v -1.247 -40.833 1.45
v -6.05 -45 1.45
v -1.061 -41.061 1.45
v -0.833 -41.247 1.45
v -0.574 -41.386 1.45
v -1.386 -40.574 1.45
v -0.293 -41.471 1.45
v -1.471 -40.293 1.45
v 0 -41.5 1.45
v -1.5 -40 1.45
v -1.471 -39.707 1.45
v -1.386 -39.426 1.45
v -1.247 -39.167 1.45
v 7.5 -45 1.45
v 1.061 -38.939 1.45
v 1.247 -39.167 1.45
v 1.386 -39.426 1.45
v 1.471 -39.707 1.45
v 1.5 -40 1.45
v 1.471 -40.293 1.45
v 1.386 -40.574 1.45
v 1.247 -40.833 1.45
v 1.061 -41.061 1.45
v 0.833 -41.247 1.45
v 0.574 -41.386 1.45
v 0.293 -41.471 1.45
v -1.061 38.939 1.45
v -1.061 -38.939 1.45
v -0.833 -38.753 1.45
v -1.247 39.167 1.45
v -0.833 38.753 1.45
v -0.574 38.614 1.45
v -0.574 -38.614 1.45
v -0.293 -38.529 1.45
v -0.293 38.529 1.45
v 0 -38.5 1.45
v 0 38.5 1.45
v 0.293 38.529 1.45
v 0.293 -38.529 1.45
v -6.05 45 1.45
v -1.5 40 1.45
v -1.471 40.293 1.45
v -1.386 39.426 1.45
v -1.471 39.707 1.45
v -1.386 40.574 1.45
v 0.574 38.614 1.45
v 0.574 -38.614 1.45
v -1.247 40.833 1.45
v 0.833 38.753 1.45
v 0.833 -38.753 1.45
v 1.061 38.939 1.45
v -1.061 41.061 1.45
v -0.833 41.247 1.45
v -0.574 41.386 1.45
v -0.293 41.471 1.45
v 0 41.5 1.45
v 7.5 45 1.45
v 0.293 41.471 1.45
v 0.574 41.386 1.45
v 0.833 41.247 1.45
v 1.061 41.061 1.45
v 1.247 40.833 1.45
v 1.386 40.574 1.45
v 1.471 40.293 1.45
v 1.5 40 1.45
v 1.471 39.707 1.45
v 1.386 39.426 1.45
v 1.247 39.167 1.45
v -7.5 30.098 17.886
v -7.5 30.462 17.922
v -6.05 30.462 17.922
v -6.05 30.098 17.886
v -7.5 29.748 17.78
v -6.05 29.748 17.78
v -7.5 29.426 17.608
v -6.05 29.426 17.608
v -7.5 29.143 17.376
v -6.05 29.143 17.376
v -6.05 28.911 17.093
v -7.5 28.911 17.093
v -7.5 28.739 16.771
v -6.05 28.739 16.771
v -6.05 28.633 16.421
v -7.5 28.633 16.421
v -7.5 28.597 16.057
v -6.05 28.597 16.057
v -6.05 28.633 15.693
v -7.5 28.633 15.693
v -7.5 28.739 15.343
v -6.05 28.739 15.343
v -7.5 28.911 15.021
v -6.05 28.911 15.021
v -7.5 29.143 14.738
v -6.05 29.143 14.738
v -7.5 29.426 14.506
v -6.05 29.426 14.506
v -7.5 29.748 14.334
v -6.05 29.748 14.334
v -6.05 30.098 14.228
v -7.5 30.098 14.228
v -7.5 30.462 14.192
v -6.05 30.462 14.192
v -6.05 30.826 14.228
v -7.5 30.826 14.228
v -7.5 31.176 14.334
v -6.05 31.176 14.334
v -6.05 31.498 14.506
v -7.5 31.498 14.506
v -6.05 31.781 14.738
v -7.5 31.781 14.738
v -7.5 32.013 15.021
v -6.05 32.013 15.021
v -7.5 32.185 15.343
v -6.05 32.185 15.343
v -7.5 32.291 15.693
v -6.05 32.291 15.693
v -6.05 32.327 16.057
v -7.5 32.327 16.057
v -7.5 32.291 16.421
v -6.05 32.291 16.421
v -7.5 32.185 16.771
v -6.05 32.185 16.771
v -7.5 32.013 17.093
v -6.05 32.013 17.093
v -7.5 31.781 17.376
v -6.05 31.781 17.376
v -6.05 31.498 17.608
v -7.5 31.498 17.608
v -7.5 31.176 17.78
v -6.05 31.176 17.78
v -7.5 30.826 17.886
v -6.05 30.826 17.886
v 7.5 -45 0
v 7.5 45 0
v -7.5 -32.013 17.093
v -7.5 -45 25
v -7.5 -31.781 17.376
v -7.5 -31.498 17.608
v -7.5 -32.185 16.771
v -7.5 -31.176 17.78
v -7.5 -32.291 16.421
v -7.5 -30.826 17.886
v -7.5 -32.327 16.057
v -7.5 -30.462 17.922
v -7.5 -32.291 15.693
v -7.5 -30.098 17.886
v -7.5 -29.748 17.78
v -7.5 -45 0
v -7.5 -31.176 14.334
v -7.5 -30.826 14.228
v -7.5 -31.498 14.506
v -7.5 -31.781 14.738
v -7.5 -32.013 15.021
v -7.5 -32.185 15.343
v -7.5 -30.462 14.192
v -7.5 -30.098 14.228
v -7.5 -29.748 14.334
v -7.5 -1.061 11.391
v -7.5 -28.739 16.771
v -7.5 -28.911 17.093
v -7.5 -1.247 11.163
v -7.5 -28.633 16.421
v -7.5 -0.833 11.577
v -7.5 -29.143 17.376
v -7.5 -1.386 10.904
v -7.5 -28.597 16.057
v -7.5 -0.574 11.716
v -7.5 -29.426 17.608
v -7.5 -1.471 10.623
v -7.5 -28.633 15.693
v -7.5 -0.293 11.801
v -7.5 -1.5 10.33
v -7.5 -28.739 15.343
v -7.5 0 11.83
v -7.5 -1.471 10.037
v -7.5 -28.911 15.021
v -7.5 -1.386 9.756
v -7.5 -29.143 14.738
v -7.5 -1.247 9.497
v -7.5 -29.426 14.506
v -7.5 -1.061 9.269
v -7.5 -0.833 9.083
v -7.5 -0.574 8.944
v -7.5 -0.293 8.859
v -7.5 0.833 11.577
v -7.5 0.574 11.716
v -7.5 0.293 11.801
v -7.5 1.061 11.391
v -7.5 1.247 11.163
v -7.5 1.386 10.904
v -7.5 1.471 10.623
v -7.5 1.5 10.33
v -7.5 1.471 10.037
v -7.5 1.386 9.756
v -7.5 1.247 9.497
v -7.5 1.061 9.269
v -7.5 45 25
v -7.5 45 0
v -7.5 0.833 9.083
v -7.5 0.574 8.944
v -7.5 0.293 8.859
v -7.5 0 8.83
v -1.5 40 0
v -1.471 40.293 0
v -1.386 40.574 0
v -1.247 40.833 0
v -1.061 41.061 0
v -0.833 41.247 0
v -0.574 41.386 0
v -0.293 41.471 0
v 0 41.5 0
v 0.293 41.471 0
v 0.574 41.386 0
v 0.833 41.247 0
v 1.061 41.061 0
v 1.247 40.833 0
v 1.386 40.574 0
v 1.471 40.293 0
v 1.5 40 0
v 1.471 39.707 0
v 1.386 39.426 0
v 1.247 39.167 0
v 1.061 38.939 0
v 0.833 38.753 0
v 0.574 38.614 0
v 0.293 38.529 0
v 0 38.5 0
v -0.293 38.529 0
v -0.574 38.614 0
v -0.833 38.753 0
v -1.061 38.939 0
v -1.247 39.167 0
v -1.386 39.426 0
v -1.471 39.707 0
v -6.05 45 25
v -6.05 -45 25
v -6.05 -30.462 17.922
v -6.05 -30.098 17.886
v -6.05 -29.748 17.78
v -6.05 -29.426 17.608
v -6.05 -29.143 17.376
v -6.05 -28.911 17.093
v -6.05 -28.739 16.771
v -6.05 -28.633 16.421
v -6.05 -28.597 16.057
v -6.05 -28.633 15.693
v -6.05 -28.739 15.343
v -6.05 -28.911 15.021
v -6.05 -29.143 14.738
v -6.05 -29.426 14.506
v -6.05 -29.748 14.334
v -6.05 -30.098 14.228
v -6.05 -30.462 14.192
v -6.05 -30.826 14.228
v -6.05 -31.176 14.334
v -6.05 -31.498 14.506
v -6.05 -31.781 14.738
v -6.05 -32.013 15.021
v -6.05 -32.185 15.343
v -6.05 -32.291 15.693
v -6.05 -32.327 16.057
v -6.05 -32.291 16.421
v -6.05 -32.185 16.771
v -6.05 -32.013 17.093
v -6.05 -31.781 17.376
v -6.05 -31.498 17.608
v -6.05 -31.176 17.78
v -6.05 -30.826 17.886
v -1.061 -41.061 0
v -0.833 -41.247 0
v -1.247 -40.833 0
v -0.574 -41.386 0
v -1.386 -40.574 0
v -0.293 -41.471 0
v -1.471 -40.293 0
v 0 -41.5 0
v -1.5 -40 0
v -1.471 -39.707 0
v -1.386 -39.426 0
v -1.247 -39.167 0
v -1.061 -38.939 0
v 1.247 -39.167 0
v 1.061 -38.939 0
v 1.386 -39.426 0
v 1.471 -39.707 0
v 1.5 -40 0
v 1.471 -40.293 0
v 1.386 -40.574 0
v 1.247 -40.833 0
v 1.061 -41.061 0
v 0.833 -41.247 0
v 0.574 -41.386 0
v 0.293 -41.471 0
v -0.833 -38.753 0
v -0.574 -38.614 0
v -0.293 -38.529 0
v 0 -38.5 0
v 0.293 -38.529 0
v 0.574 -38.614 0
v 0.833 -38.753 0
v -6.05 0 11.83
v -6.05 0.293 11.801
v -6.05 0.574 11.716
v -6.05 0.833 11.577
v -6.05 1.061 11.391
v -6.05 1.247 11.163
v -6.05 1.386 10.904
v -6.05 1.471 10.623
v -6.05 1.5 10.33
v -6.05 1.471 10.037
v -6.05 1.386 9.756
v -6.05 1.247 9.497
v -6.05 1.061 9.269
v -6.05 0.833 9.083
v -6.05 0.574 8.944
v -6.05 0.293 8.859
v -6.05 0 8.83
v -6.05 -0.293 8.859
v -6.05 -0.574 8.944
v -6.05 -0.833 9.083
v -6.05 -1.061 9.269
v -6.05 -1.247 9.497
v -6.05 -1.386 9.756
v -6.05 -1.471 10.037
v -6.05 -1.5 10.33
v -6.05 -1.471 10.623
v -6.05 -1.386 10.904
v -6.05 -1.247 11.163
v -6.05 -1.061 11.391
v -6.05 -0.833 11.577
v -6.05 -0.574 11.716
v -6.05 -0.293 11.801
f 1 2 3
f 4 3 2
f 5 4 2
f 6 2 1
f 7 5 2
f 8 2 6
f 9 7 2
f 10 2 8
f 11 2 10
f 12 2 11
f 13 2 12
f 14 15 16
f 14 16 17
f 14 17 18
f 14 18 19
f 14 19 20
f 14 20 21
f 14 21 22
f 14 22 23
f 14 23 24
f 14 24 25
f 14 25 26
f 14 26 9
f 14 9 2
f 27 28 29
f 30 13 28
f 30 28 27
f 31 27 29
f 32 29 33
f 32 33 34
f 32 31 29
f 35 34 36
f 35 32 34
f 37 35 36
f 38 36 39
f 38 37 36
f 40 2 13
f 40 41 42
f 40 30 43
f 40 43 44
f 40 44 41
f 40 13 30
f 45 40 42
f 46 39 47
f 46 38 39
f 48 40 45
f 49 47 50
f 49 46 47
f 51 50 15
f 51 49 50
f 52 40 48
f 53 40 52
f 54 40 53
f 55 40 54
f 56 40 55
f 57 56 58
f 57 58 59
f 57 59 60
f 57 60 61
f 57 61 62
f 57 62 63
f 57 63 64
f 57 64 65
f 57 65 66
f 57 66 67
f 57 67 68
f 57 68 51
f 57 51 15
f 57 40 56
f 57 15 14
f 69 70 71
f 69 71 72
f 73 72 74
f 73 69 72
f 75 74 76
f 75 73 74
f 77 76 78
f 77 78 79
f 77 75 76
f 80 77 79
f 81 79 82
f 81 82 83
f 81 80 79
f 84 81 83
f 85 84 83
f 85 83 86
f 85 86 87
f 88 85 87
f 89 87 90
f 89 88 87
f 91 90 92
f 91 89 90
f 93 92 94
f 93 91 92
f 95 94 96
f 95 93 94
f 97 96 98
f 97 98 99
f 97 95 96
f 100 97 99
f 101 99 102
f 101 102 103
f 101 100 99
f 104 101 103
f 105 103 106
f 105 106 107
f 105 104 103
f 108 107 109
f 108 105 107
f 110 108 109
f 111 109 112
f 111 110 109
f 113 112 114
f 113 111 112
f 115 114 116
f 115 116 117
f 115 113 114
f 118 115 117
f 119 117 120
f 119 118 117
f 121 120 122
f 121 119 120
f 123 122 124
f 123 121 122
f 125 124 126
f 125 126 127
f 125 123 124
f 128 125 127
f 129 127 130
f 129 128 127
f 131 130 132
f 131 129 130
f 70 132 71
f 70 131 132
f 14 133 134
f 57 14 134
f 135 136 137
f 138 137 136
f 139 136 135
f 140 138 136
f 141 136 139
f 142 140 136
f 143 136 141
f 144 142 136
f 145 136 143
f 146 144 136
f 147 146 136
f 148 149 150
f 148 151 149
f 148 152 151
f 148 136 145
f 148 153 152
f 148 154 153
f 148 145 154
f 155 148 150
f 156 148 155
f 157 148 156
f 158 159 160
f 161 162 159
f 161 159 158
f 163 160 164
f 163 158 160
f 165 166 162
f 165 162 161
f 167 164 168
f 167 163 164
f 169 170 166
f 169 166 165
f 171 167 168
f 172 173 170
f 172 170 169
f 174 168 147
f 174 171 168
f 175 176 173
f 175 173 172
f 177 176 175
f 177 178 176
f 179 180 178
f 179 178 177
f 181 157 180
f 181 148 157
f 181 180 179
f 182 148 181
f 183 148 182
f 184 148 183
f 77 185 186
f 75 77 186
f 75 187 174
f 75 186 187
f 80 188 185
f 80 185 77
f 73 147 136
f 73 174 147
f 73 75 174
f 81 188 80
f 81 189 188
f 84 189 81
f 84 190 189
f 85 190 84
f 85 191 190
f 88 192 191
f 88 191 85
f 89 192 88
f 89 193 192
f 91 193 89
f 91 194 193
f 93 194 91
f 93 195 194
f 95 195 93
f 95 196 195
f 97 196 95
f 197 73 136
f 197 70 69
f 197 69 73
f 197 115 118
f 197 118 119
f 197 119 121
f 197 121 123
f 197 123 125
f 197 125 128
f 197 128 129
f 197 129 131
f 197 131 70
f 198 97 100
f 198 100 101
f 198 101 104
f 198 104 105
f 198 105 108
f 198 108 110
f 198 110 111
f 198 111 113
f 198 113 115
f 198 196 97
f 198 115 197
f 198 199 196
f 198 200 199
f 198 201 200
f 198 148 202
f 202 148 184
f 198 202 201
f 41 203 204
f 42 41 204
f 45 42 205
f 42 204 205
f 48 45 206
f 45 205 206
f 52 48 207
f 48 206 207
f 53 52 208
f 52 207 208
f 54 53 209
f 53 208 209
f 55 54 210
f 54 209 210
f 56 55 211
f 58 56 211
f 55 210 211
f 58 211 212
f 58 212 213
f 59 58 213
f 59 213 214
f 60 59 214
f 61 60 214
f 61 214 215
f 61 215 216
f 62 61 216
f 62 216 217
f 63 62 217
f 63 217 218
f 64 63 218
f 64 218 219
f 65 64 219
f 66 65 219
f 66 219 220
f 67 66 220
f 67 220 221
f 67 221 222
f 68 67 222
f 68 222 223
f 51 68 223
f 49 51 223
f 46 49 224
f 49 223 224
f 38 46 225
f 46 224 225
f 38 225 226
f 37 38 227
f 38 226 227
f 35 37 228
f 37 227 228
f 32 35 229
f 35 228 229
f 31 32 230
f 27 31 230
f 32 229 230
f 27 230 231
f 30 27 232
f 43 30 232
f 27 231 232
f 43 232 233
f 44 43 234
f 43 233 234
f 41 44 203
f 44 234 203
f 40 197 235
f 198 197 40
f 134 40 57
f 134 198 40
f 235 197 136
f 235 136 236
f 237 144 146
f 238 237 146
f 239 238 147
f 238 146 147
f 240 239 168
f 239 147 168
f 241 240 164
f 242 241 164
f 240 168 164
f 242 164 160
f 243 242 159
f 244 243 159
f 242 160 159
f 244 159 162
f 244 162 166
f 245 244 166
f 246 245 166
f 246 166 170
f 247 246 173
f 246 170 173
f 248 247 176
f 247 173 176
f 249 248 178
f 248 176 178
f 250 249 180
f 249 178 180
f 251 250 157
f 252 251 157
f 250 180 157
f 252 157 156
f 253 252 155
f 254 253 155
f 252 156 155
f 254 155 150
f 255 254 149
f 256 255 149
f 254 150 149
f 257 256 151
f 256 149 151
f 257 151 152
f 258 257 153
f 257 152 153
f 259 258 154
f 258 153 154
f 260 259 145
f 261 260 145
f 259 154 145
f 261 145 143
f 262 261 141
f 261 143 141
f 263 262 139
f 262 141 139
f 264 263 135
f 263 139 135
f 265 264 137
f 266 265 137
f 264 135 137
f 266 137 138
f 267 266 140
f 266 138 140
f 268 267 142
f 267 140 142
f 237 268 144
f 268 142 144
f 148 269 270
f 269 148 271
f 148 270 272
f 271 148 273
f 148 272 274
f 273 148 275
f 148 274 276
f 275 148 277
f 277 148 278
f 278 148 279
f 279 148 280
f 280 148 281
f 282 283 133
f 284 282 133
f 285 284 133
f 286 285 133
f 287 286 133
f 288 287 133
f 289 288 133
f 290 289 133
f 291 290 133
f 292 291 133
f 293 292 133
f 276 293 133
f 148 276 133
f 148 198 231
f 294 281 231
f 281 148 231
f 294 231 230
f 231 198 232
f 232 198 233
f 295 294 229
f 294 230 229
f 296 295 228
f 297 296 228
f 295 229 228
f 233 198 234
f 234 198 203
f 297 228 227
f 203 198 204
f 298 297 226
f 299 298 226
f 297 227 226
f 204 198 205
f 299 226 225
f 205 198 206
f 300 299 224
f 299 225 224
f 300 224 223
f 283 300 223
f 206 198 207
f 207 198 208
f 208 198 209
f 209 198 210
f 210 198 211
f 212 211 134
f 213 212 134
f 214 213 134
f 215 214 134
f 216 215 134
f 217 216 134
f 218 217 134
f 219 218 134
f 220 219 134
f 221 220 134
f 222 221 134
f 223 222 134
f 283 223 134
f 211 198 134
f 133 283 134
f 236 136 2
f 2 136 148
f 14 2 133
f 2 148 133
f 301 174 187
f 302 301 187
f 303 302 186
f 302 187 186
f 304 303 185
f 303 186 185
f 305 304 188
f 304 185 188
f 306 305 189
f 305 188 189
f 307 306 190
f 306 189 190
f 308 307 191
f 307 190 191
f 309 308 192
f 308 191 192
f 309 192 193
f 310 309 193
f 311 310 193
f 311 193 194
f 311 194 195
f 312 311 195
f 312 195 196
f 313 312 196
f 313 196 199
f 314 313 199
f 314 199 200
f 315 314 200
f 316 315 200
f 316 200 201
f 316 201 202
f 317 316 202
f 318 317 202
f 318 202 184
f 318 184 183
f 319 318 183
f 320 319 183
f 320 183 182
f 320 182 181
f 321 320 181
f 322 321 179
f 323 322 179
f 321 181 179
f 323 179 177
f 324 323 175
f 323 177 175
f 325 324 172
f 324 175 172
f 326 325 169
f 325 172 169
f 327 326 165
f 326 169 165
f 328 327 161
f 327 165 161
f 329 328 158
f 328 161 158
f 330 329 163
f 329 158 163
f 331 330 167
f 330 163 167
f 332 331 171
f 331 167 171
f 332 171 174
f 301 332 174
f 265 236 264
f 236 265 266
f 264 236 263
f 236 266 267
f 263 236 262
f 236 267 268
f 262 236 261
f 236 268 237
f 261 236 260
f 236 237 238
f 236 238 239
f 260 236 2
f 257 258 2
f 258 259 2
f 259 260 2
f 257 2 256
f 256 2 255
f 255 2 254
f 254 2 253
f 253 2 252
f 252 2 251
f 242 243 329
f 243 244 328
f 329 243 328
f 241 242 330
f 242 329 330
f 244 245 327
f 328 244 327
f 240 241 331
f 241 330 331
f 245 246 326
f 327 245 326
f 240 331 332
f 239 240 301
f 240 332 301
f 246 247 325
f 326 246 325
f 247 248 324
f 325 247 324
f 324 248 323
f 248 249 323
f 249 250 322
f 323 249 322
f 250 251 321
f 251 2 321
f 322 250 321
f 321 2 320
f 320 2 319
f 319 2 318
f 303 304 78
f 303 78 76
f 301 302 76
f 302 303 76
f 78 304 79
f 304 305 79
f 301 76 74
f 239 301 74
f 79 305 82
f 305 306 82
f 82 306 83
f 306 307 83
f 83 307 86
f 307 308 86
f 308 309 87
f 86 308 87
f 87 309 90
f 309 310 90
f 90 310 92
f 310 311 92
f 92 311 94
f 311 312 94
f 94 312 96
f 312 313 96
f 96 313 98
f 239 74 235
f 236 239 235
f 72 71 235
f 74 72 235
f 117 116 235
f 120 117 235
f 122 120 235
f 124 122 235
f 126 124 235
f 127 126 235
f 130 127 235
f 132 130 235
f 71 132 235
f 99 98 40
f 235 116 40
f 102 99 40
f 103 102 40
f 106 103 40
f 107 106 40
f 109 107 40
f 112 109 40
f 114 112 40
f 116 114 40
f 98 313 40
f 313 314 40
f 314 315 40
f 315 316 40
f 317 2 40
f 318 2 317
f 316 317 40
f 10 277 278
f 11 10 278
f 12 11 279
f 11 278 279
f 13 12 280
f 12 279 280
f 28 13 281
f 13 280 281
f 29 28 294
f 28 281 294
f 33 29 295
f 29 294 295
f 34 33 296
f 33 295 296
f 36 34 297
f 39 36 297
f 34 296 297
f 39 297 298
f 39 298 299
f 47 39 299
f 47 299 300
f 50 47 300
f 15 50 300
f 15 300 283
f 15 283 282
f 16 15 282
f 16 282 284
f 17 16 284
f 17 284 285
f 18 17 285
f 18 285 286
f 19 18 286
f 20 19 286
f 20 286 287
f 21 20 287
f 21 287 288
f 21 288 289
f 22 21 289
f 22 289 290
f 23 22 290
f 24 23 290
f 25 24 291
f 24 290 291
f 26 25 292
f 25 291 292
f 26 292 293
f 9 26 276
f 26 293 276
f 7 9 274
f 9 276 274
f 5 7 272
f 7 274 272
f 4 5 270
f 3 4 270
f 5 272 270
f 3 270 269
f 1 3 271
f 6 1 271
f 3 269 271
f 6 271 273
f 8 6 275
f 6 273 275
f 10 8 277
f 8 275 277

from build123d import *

# Parameters (mm, degrees)
SKETCH1_W           = 15
SKETCH1_H           = 90
BOSS_EXTRUDE1_DEPTH = 1.45
SKETCH2_W           = 1.45
SKETCH2_H           = 90
BOSS_EXTRUDE2_DEPTH = 23.55
SKETCH3_R           = 1.5
CUT_EXTRUDE1_DEPTH  = 26
SKETCH5_R           = 1.865
CUT_EXTRUDE2_DEPTH  = 1.45
CUT_EXTRUDE3_REACH  = 17
SKETCH6_R           = 1.5


with BuildPart() as part:
    # Sketch1 → Boss-Extrude1 (new body)
    with BuildSketch(Plane.XY):
        Rectangle(SKETCH1_W, SKETCH1_H)
    extrude(amount=BOSS_EXTRUDE1_DEPTH)

    # Sketch2 → Boss-Extrude2 (add)
    with BuildSketch(Plane.XY.offset(1.45)):
        with Locations((-6.775, 0)):
            Rectangle(SKETCH2_W, SKETCH2_H)
    extrude(amount=BOSS_EXTRUDE2_DEPTH)

    # Sketch3 → Cut-Extrude1 (cut, through all)
    with BuildSketch(Plane(origin=(0, 0, 0), x_dir=(-1, 0, 0), z_dir=(0, 0, -1))):
        with Locations((0, 40)):
            Circle(SKETCH3_R)
        with Locations((0, -40)):
            Circle(SKETCH3_R)
    extrude(amount=-CUT_EXTRUDE1_DEPTH, mode=Mode.SUBTRACT)

    # Sketch5 → Cut-Extrude2 (cut)
    with BuildSketch(Plane.ZY.offset(7.5)):
        with Locations((16.057, -30.462)):
            Circle(SKETCH5_R)
    cut_extrude2 = extrude(amount=-CUT_EXTRUDE2_DEPTH, mode=Mode.SUBTRACT)

    # Mirror1: Cut-Extrude2 across plane
    add(cut_extrude2.mirror(Plane.ZX), mode=Mode.SUBTRACT)

    # Sketch6 → Cut-Extrude3 (cut, up to next)
    with BuildSketch(Plane.ZY.offset(7.5), mode=Mode.PRIVATE) as cut_extrude3_sk1:
        with Locations((10.33, 0)):
            Circle(SKETCH6_R)
    cut_extrude3_tool1 = extrude(cut_extrude3_sk1.sketch, amount=-CUT_EXTRUDE3_REACH, mode=Mode.PRIVATE) & part.part
    add(cut_extrude3_tool1.solids().sort_by_distance((-7.5, 0, 10.33))[0], mode=Mode.SUBTRACT)


solid = part.part
